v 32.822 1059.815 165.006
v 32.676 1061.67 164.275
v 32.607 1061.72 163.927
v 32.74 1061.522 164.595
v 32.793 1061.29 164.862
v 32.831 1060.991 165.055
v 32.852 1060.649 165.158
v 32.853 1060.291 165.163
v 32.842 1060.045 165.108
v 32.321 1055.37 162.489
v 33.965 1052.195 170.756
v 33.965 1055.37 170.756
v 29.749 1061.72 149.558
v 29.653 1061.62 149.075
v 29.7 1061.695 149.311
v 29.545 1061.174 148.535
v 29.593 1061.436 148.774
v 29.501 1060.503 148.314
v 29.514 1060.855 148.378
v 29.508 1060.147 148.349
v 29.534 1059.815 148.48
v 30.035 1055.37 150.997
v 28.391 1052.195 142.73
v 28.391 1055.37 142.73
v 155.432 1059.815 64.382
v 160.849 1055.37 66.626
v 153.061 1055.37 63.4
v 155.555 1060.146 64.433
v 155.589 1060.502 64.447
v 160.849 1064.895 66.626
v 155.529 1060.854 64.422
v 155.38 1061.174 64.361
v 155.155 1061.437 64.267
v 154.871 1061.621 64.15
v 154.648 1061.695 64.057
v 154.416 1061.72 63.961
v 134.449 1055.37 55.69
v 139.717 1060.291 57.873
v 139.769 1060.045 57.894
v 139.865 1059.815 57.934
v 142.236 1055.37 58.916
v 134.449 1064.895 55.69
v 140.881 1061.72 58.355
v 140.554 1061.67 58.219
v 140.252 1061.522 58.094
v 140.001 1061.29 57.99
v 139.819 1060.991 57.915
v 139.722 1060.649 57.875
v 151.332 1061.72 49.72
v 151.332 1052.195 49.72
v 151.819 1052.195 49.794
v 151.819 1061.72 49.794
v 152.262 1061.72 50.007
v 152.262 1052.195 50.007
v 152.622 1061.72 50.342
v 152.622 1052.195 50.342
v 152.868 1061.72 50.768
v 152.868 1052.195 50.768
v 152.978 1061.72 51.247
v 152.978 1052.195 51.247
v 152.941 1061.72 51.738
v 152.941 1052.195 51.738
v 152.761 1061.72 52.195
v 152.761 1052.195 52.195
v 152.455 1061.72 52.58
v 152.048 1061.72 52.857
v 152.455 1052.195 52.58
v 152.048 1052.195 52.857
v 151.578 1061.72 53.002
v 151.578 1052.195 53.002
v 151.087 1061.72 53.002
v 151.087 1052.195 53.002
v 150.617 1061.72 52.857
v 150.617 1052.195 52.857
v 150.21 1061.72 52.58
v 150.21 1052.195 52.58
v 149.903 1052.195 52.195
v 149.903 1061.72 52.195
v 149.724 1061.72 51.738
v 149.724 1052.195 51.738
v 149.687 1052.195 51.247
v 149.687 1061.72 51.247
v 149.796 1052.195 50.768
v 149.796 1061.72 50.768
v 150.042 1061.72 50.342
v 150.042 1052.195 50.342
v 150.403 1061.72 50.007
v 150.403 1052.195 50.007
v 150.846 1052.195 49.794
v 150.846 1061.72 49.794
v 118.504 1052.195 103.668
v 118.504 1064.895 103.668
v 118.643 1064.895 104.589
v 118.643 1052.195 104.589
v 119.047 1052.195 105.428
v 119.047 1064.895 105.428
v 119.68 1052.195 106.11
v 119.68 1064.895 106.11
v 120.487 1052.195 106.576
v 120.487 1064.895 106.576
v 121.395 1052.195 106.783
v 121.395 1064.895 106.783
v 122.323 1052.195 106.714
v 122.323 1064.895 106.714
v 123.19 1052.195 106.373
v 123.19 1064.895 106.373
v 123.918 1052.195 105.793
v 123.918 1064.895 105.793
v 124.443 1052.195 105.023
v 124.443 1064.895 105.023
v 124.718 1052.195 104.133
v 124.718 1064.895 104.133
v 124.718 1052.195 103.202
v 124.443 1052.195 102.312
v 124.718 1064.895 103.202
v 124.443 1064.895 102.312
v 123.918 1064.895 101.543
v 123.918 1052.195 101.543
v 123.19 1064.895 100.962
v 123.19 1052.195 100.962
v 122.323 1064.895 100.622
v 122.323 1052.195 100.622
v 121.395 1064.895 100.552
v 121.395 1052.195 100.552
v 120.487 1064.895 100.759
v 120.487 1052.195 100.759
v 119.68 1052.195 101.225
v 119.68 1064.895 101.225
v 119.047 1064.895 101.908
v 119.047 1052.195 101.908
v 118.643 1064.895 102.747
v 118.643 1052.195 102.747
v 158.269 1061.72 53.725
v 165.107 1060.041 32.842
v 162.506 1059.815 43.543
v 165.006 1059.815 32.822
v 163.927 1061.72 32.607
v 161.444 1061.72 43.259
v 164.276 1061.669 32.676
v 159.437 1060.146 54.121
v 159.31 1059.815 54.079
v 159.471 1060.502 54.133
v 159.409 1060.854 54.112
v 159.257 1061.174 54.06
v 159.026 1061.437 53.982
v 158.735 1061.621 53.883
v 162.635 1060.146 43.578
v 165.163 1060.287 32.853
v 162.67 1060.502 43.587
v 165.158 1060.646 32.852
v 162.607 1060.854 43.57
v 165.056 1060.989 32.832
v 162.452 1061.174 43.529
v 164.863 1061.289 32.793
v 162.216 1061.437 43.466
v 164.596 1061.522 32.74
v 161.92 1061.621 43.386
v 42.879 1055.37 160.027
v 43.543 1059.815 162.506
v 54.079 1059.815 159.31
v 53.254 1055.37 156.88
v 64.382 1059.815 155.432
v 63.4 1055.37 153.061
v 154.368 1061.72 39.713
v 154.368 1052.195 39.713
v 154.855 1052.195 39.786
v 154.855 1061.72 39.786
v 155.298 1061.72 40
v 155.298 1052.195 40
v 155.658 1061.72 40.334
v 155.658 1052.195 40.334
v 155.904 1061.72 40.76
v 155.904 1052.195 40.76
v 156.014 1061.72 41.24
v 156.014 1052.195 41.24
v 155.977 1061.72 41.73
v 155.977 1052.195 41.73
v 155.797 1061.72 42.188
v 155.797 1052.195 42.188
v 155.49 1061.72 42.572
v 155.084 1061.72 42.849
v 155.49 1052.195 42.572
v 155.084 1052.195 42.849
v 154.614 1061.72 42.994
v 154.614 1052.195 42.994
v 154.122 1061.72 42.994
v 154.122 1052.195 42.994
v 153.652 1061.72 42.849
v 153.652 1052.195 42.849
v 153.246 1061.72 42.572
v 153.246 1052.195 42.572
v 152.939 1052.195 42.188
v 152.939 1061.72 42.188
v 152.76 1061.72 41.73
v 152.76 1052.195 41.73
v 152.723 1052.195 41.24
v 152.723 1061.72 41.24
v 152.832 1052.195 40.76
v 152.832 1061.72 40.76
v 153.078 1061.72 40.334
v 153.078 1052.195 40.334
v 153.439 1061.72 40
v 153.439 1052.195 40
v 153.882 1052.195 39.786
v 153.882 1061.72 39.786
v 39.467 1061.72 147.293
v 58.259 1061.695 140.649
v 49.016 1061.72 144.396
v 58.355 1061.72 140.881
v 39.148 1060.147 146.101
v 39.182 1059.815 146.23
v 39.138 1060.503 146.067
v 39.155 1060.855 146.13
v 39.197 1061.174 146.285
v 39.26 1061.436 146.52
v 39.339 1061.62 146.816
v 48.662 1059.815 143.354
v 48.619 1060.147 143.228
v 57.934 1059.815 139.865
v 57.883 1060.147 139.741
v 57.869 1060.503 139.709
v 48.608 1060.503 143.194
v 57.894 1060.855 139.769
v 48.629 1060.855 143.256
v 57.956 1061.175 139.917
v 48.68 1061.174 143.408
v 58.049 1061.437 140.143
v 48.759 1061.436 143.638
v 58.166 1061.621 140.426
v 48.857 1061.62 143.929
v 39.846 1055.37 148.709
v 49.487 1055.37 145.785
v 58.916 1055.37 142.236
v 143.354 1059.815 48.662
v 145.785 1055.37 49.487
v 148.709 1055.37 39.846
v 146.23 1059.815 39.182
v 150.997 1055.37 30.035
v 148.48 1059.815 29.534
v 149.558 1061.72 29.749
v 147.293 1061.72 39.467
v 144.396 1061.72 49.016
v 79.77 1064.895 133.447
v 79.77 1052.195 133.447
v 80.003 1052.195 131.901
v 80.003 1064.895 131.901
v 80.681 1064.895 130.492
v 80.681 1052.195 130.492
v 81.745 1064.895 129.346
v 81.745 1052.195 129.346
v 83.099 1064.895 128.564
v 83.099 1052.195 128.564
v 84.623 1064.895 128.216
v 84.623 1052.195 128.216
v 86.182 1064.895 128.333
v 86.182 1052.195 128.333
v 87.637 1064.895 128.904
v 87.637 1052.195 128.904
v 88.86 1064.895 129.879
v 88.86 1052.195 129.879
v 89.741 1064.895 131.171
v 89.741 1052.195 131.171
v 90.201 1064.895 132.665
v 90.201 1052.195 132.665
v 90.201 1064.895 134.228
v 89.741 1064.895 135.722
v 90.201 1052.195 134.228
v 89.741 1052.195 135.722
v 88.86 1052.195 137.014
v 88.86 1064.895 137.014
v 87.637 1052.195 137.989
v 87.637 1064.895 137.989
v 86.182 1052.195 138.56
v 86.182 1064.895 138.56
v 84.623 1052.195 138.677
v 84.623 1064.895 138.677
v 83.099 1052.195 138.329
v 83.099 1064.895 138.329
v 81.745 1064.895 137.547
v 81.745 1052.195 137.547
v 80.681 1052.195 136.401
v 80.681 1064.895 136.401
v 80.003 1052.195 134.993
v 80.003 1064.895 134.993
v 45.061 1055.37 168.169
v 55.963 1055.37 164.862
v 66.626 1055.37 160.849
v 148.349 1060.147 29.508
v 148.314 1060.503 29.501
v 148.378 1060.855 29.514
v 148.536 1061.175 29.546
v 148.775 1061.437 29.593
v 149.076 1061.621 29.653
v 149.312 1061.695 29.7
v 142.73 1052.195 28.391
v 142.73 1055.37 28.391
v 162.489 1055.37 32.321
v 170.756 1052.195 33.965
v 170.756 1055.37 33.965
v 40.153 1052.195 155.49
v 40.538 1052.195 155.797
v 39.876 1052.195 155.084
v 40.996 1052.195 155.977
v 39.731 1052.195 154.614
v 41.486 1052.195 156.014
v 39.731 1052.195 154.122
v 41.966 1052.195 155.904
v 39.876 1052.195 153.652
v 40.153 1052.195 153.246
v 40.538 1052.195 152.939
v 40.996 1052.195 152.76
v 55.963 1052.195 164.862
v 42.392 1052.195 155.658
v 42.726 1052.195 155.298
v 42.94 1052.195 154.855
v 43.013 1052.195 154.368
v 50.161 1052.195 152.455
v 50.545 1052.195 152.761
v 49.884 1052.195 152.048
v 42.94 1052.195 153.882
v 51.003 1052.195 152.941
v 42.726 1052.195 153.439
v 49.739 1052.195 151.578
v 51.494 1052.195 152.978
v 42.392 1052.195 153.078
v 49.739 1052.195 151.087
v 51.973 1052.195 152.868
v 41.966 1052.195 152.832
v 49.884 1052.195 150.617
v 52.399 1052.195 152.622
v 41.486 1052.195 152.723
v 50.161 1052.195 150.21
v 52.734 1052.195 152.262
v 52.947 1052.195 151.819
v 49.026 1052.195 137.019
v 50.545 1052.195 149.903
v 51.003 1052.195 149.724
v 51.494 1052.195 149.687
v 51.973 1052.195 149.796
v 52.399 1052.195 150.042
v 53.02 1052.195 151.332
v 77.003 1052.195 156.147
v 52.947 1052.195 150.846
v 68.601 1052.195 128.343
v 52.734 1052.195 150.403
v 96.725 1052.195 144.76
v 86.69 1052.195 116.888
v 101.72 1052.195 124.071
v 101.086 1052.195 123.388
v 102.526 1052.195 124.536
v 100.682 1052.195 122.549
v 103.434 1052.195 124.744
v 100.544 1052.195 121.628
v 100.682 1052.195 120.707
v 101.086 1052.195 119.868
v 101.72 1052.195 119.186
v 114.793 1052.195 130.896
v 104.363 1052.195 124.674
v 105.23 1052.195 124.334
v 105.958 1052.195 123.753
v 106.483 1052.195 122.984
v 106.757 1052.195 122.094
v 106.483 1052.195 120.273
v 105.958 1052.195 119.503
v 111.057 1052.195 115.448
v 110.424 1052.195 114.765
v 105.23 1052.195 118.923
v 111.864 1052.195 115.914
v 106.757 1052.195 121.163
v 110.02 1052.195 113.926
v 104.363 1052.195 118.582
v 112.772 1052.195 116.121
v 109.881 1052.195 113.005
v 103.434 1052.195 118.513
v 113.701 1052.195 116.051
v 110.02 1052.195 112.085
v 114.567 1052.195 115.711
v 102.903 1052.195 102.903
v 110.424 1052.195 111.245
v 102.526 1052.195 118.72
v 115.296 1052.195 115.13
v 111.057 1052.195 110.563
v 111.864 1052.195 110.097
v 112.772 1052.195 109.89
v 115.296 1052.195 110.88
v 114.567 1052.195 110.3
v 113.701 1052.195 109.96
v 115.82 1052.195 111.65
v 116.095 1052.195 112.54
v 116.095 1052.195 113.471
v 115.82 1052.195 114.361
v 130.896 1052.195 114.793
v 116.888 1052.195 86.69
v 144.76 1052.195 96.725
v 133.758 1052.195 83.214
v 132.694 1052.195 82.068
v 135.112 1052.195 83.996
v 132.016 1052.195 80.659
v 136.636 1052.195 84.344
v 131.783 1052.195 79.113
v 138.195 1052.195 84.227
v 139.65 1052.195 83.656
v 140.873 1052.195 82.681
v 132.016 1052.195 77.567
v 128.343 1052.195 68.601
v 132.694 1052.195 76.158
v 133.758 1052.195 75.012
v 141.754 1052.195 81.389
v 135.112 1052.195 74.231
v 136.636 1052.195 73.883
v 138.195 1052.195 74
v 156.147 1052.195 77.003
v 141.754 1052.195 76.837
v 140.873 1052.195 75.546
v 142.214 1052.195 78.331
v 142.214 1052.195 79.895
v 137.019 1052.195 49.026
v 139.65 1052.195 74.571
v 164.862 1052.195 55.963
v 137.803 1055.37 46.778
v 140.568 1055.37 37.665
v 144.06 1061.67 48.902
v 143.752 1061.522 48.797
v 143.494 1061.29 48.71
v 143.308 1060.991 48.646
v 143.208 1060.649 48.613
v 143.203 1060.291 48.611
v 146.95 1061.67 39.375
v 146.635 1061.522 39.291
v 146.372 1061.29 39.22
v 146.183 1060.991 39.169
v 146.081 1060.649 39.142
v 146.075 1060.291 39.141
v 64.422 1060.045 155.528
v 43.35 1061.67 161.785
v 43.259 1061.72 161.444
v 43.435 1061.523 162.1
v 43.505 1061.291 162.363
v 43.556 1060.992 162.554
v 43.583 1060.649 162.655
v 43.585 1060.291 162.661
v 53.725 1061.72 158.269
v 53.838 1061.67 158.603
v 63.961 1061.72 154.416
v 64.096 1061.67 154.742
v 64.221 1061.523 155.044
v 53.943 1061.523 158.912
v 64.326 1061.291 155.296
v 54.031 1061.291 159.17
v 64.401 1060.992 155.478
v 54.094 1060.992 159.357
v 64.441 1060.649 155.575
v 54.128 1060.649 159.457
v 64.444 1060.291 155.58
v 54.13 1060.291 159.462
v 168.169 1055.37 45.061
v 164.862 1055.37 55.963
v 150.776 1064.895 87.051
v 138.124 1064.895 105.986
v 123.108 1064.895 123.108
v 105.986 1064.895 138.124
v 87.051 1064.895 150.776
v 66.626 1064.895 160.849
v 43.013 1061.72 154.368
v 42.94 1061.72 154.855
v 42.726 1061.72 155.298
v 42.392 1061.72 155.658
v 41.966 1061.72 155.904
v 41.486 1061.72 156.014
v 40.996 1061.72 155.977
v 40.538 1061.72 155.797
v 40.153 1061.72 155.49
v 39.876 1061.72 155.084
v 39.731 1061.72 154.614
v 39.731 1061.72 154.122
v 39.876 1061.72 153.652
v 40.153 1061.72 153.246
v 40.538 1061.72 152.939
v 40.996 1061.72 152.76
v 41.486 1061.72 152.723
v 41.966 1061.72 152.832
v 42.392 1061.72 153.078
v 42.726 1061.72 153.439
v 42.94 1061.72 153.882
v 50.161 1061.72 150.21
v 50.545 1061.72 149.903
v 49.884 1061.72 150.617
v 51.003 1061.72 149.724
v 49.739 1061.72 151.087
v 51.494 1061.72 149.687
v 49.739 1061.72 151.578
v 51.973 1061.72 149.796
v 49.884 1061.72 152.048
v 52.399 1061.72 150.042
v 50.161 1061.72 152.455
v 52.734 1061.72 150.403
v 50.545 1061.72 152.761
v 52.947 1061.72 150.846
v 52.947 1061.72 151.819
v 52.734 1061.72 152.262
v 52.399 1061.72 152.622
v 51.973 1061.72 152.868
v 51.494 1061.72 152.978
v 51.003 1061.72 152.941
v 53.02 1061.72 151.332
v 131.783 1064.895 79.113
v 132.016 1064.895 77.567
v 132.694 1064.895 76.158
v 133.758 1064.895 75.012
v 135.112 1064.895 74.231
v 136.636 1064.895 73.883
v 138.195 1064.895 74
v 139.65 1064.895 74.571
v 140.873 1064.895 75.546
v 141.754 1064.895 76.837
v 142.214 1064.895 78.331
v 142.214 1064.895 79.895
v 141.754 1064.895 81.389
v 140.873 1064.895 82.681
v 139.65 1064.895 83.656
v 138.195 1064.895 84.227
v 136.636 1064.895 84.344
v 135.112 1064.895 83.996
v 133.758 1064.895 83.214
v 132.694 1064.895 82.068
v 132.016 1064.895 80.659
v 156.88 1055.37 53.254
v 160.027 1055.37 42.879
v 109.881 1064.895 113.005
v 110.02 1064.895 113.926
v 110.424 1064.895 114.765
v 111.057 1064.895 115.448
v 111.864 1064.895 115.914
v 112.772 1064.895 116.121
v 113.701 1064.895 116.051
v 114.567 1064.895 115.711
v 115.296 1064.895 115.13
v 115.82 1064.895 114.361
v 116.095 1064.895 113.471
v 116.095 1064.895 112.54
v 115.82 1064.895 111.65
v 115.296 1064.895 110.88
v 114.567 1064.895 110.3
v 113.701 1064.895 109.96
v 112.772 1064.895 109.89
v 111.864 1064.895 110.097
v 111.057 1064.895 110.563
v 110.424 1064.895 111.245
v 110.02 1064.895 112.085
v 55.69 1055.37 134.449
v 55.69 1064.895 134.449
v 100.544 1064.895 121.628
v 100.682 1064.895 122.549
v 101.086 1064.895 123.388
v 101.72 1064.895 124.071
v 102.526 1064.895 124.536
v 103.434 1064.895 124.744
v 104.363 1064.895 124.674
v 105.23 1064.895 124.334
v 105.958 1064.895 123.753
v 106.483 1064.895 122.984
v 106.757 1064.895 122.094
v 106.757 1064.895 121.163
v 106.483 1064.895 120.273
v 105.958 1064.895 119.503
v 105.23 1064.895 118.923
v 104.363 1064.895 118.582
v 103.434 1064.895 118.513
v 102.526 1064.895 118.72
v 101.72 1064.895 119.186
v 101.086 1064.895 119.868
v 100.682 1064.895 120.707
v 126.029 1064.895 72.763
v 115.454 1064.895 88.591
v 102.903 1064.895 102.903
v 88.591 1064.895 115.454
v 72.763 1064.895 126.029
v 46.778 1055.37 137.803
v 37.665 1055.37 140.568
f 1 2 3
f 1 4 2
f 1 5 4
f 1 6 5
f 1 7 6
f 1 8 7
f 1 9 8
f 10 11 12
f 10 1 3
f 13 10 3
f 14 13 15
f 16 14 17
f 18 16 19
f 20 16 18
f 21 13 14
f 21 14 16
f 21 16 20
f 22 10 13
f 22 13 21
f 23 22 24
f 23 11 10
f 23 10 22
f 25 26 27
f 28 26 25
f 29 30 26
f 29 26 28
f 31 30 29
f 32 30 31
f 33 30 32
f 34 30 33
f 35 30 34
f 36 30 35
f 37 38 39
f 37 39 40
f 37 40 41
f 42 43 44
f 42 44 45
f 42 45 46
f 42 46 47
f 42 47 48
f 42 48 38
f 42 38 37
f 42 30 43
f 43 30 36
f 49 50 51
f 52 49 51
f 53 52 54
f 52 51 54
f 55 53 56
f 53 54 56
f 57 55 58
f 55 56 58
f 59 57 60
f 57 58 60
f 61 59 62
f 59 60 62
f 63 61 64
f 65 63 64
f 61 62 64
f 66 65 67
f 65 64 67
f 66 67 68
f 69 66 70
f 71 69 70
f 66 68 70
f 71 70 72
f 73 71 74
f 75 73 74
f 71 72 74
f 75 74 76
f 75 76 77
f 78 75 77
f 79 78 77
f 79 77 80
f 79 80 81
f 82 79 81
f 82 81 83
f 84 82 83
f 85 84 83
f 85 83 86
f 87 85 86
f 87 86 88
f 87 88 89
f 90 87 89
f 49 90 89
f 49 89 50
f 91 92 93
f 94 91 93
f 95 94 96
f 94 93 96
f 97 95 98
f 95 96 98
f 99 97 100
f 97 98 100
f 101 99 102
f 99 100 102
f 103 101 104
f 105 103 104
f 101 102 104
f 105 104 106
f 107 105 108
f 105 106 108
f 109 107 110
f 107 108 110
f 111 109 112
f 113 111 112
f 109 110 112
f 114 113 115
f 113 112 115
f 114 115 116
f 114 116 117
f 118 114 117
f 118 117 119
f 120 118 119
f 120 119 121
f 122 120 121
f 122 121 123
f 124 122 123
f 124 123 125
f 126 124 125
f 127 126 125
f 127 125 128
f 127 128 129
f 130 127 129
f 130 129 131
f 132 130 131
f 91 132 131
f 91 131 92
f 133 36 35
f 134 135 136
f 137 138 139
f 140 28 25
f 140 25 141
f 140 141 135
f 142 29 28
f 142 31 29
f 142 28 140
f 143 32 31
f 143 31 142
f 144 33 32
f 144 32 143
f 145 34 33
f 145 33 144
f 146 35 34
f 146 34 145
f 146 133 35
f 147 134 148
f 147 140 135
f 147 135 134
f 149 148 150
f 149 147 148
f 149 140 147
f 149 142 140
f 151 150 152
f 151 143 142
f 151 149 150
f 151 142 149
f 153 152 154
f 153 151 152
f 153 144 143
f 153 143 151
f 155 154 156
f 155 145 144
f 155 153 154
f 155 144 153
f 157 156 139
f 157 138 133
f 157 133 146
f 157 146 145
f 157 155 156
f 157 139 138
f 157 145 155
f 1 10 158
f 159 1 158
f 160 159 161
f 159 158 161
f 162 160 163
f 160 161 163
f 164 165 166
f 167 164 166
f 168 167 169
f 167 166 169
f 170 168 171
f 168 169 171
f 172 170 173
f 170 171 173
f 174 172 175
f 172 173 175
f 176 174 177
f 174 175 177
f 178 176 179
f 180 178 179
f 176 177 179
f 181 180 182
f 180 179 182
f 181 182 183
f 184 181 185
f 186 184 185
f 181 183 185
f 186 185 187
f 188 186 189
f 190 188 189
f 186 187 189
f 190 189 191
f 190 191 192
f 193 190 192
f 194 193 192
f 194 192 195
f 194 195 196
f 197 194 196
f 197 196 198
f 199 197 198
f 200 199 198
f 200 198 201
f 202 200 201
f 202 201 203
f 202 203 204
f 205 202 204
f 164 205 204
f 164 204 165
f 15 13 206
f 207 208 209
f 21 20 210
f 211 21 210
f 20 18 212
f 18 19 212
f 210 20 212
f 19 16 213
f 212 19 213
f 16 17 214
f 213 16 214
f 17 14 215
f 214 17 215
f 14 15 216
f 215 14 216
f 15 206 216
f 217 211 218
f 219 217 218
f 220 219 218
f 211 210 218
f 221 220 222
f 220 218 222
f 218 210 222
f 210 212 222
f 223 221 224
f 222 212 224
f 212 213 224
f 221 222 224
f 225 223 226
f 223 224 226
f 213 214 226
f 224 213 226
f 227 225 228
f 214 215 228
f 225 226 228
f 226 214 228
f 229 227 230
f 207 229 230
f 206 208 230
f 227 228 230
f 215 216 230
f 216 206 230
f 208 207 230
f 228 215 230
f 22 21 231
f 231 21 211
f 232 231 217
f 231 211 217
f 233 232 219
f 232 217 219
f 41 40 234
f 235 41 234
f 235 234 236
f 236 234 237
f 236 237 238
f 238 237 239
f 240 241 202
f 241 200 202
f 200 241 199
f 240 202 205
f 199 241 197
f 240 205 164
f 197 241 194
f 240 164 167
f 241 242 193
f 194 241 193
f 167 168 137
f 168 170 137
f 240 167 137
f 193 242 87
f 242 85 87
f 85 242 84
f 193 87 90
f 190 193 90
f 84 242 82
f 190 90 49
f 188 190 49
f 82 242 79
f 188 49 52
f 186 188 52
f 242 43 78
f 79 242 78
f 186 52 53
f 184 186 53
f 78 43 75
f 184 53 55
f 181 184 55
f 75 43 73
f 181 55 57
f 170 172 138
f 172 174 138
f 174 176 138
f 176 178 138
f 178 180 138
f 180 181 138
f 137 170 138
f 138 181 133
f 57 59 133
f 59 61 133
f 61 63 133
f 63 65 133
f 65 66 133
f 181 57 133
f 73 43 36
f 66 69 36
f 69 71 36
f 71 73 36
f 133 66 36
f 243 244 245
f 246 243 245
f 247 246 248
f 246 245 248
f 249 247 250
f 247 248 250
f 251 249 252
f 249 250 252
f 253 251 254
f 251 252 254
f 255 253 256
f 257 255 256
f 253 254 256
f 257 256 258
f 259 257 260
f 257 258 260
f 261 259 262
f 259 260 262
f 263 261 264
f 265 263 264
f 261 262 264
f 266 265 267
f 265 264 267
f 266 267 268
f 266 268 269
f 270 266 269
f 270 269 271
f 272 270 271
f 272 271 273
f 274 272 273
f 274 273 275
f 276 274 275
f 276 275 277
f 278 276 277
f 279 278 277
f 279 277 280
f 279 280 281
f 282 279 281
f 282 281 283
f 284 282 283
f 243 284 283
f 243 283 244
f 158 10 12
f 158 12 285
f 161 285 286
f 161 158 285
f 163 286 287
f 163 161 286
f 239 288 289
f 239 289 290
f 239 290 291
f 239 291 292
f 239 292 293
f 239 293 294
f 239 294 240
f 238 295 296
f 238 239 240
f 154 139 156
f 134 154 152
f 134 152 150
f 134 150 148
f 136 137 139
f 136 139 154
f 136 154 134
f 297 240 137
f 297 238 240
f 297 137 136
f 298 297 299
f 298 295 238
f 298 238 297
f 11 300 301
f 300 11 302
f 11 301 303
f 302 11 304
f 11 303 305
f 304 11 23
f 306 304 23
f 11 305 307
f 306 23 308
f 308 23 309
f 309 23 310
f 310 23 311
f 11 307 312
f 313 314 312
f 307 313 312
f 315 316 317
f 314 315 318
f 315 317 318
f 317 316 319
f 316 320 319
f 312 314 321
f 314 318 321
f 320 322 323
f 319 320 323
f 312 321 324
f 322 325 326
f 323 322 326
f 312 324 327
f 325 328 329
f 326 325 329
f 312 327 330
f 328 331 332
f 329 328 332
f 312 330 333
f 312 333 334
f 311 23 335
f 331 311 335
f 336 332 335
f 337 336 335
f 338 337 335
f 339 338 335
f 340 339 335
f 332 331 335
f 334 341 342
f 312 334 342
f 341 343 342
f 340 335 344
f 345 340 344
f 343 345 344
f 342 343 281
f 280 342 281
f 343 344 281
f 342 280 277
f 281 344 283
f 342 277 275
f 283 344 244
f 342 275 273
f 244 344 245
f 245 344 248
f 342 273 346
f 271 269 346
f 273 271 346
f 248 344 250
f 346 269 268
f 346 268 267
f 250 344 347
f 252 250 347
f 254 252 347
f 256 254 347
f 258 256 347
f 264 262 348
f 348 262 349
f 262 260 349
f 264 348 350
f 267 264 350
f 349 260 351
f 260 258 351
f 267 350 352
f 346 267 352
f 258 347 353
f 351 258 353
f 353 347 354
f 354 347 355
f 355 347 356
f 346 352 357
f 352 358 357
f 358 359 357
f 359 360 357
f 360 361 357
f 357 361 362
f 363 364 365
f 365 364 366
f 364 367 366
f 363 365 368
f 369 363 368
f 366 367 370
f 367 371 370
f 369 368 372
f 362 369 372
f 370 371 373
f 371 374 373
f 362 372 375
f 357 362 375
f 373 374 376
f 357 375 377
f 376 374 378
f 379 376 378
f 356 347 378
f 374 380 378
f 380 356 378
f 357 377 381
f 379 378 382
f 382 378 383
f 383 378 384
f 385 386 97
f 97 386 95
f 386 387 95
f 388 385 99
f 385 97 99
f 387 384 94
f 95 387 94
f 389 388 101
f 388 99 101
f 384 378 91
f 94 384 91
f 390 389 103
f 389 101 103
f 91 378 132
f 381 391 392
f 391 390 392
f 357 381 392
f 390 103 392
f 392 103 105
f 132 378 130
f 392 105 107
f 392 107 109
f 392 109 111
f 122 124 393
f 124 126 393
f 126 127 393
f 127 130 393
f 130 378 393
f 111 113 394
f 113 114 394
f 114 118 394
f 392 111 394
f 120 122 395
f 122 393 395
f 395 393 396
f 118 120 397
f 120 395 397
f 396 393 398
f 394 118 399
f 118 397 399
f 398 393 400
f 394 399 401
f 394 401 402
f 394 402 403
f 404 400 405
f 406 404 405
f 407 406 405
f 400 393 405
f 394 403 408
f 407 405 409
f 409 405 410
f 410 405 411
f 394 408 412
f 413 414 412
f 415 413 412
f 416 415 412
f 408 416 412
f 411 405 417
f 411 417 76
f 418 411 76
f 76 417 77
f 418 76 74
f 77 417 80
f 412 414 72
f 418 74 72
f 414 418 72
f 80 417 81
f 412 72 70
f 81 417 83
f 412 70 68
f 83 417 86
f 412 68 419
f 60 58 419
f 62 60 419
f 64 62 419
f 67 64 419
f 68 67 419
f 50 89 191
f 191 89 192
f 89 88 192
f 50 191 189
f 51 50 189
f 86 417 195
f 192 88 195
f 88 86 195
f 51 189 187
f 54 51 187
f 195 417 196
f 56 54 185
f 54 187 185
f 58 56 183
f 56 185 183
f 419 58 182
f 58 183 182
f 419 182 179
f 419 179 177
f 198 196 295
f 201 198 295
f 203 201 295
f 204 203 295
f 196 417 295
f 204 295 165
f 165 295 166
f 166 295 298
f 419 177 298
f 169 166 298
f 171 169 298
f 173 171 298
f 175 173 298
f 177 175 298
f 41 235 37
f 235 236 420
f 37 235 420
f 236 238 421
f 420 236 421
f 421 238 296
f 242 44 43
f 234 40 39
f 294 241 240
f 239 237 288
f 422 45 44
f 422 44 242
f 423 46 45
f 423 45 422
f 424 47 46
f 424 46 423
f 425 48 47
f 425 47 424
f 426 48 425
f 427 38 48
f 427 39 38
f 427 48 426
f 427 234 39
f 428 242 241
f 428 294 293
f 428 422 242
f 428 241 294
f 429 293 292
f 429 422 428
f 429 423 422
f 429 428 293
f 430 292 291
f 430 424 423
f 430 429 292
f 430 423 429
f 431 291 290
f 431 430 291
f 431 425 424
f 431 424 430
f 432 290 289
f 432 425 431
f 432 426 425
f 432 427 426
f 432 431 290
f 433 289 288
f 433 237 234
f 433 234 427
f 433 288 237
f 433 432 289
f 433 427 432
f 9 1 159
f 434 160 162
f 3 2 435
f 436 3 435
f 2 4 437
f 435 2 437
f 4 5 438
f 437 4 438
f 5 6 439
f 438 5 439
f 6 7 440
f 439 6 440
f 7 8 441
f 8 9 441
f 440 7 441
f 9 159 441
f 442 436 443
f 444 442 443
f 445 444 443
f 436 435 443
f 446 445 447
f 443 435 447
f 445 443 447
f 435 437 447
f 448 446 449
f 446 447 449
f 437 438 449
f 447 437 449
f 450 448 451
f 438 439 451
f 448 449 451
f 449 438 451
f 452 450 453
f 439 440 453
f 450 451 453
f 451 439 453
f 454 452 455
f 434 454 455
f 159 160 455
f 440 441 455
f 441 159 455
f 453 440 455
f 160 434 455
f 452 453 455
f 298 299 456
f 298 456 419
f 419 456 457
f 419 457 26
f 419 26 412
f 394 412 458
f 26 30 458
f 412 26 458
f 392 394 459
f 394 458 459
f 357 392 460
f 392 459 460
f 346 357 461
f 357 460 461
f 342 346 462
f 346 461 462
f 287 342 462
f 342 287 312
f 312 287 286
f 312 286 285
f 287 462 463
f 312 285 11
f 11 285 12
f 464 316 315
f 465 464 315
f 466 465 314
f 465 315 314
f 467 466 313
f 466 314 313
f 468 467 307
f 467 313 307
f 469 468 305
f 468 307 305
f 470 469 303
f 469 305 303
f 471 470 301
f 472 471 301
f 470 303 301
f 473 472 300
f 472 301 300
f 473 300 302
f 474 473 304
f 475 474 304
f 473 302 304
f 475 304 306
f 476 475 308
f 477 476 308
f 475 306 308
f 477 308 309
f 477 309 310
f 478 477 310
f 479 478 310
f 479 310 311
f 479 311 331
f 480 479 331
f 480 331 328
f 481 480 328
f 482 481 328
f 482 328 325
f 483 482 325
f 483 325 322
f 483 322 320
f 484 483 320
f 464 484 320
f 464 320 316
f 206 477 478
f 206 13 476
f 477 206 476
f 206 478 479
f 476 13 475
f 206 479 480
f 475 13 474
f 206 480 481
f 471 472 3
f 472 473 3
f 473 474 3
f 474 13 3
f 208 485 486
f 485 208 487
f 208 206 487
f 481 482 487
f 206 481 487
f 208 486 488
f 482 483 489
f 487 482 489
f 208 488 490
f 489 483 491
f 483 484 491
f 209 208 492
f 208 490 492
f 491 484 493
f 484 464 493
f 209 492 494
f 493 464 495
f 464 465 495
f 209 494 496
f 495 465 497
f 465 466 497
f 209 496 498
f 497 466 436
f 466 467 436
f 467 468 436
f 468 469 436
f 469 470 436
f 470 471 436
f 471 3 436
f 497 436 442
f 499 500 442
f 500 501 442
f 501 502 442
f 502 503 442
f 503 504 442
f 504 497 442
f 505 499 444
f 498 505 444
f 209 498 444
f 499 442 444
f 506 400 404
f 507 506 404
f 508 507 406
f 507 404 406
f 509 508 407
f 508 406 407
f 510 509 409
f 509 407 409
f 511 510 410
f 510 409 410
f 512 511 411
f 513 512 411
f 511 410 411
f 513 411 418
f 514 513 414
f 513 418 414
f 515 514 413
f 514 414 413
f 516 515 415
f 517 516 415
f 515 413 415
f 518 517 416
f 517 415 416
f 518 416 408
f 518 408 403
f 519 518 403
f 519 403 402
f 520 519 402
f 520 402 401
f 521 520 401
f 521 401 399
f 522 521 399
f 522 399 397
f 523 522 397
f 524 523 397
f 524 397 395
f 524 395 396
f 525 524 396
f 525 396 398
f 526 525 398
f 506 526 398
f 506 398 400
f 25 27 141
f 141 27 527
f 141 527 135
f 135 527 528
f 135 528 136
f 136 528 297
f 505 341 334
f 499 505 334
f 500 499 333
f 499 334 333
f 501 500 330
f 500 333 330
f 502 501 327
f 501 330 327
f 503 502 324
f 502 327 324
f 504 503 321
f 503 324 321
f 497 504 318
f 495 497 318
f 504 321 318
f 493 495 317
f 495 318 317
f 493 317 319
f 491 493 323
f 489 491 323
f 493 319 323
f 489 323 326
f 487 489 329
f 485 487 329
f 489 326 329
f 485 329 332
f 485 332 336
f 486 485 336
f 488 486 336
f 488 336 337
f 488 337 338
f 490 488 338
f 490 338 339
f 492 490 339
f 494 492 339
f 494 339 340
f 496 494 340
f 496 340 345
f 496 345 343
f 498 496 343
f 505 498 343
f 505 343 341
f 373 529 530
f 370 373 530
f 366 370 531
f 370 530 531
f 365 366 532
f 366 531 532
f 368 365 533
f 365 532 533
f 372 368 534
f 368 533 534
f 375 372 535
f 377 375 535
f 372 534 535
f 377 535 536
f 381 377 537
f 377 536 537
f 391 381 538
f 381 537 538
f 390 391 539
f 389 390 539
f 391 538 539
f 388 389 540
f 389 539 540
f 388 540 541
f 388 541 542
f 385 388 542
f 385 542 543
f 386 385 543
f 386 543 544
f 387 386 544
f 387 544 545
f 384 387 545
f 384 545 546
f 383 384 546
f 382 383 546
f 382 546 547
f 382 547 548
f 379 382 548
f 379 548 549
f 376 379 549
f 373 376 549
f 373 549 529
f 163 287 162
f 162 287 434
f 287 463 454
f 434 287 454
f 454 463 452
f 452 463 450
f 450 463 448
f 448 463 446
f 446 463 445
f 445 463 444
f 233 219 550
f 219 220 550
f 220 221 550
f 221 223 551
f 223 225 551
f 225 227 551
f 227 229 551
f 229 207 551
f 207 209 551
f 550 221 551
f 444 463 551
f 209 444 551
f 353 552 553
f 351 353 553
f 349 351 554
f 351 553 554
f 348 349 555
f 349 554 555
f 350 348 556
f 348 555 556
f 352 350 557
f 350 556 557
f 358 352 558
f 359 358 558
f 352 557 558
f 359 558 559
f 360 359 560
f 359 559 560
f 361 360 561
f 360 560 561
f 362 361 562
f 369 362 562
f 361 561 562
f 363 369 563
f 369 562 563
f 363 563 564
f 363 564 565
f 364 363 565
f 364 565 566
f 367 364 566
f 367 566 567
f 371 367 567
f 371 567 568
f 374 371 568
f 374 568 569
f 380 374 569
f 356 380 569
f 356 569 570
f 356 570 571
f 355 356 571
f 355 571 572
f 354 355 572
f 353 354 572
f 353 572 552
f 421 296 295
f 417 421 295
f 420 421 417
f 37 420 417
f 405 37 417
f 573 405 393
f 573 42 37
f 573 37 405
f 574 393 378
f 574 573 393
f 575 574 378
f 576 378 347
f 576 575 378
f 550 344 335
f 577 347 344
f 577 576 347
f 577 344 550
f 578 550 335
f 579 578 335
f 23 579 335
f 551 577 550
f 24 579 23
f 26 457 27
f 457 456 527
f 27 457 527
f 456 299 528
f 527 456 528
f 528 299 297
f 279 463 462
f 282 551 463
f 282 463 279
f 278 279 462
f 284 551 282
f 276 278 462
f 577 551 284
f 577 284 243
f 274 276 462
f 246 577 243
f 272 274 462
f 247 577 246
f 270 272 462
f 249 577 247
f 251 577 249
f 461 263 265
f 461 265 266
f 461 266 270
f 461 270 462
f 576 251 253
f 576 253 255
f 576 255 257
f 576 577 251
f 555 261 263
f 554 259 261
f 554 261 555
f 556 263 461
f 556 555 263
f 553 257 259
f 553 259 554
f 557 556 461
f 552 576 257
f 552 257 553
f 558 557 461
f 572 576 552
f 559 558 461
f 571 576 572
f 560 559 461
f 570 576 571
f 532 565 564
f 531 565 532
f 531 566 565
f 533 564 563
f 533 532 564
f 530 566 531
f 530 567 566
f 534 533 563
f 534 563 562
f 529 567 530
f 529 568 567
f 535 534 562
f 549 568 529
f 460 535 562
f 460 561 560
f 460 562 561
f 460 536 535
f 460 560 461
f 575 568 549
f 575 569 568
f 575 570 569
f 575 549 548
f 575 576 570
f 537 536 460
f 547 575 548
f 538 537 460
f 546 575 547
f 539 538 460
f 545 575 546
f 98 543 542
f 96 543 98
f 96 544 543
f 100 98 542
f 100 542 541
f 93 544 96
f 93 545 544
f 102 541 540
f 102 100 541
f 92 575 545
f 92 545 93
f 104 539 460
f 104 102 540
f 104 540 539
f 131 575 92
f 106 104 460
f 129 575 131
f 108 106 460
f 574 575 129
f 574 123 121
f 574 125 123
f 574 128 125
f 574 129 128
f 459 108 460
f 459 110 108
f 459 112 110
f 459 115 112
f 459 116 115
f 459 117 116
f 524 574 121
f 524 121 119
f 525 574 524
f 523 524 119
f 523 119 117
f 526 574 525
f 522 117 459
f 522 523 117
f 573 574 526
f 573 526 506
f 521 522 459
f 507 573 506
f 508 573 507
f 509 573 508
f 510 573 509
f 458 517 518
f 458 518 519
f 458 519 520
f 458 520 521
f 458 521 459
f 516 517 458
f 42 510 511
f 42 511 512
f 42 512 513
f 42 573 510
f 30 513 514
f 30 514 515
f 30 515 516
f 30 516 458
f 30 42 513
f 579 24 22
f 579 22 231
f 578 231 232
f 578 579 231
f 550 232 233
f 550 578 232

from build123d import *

# Parameters (mm, degrees)
SKETCH1_W                = 28.575
SKETCH1_H                = 12.7
CUT_EXTRUDE1_DEPTH       = 9.525
F_12_CLEARANCE_HOLE1_D   = 6.2484
M4X0_7_TAPPED_HOLE1_D    = 3.3
CIRPATTERN1_COUNT        = 4
Z_0_413_DIAMETER_HOLE1_D = 10.4902
FILLET1_R                = 1.27
CUT_EXTRUDE2_DEPTH       = 247.298196718
CUT_EXTRUDE2_DEPTH_BACK  = 247.298196718


with BuildPart() as part:
    # Sketch1 → Revolve1 (revolve)
    with BuildSketch(Plane.XY, mode=Mode.PRIVATE) as revolve1_sk:
        with Locations((159.813733777, 1058.545)):
            Rectangle(SKETCH1_W, SKETCH1_H)
    revolve(revolve1_sk.sketch.rotate(Axis((0, 1125.81516809, 0), (0, -1, 0)), 180), axis=Axis((0, 1125.81516809, 0), (0, -1, 0)))

    # Sketch19 → Cut-Extrude1 (cut)
    with BuildSketch(Plane(origin=(0, 1064.895, 0), x_dir=(1, 0, 0), z_dir=(0, 1, 0))):
        with BuildLine():
            Line((160.848566471, -66.625657721), (134.44870883, -55.690478641))
            ThreePointArc((134.44870883, -55.690478641), (145.526233777, 0), (134.44870883, 55.690478641))
            Line((134.44870883, 55.690478641), (160.848566471, 66.625657721))
            ThreePointArc((160.848566471, 66.625657721), (174.101233777, 0), (160.848566471, -66.625657721))
        make_face()
        with BuildLine():
            Line((-66.625657721, 160.848566471), (-55.690478641, 134.44870883))
            ThreePointArc((-55.690478641, 134.44870883), (0, 145.526233777), (55.690478641, 134.44870883))
            Line((55.690478641, 134.44870883), (66.625657721, 160.848566471))
            ThreePointArc((66.625657721, 160.848566471), (0, 174.101233777), (-66.625657721, 160.848566471))
        make_face()
        with BuildLine():
            Line((-134.44870883, -55.690478641), (-160.848566471, -66.625657721))
            ThreePointArc((-160.848566471, -66.625657721), (-174.101233777, 0), (-160.848566471, 66.625657721))
            Line((-160.848566471, 66.625657721), (-134.44870883, 55.690478641))
            ThreePointArc((-134.44870883, 55.690478641), (-145.526233777, 0), (-134.44870883, -55.690478641))
        make_face()
        with BuildLine():
            Line((-55.690478641, -134.44870883), (-66.625657721, -160.848566471))
            ThreePointArc((-66.625657721, -160.848566471), (0, -174.101233777), (66.625657721, -160.848566471))
            Line((66.625657721, -160.848566471), (55.690478641, -134.44870883))
            ThreePointArc((55.690478641, -134.44870883), (0, -145.526233777), (-55.690478641, -134.44870883))
        make_face()
    extrude(amount=-CUT_EXTRUDE1_DEPTH, mode=Mode.SUBTRACT)

    # Sketch21 → Revolve2 (revolve)
    with BuildSketch(Plane.XY):
        Polygon((-165.672559567, 1055.37), (-153.954907986, 1055.37), (-150.288733777, 1061.72), (-169.338733777, 1061.72), align=None)
    revolve(axis=Axis((0, 0, 0), (0, 1, 0)))

    # #12 Clearance Hole1 (through all)
    with Locations(Plane(origin=(0, 1052.195, 0), x_dir=(-1, 0, 0), z_dir=(0, -1, 0))):
        with Locations((103.667734326, 121.628246568), (121.628246568, 103.667734326), (113.00537488, 113.00537488)):
            f_12_clearance_hole1 = Hole(F_12_CLEARANCE_HOLE1_D / 2)

    # M4x0.7 Tapped Hole1 (through all)
    with Locations(Plane(origin=(0, 1061.72, 0), x_dir=(1, 0, 0), z_dir=(0, 1, 0))):
        with Locations((-51.370441133, 151.33243962), (-41.36283797, 154.36821285), (51.370441133, 151.33243962), (41.36283797, 154.36821285)):
            m4x0_7_tapped_hole1 = Hole(M4X0_7_TAPPED_HOLE1_D / 2)

    # CirPattern1: #12 Clearance Hole1, M4x0.7 Tapped Hole1 ×4 about axis
    cirpattern1_axis = Axis((0, 0, 0), (0, 1, 0))
    add([f_12_clearance_hole1.rotate(cirpattern1_axis, i * 360 / CIRPATTERN1_COUNT) for i in range(1, CIRPATTERN1_COUNT)], mode=Mode.SUBTRACT)
    add([m4x0_7_tapped_hole1.rotate(cirpattern1_axis, i * 360 / CIRPATTERN1_COUNT) for i in range(1, CIRPATTERN1_COUNT)], mode=Mode.SUBTRACT)

    # Z (0.413) Diameter Hole1 (through all)
    with Locations(Plane(origin=(0, 1064.895, 0), x_dir=(1, 0, 0), z_dir=(0, 1, 0))):
        with Locations((-137.027937996, -79.113116888), (137.027937996, -79.113116888), (137.027937996, 79.113116888), (-137.027937996, 79.113116888), (-85.014893438, 133.44665207), (85.014893438, 133.44665207), (85.014893438, -133.44665207), (-85.014893438, -133.44665207)):
            Hole(Z_0_413_DIAMETER_HOLE1_D / 2)

    # Fillet1
    fillet1_edges = [part.edges().sort_by_distance(p)[0] for p in [
        (-150.288733777, 1061.72, 0),
        (0, 1061.72, 150.288733777),
        (0, 1061.72, -150.288733777),
        (150.288733777, 1061.72, 0),
        (-169.338733777, 1061.72, 0),
        (0, 1061.72, 169.338733777),
        (0, 1061.72, -169.338733777),
        (169.338733777, 1061.72, 0),
    ]]
    fillet(fillet1_edges, radius=FILLET1_R)

    # Sketch23 → Cut-Extrude2 (cut, two sides: drawn at the far end of the back side and taken through both)
    with BuildSketch(Plane(origin=(0, 1058.545, 0), x_dir=(1, 0, 0), z_dir=(0, 1, 0)).offset(-CUT_EXTRUDE2_DEPTH_BACK)):
        with BuildLine():
            ThreePointArc((174.101233777, 0), (173.262888749, 17.064905063), (170.755927388, 33.965465761))
            Line((170.755927388, 33.965465761), (142.729988001, 28.390759809))
            ThreePointArc((142.729988001, 28.390759809), (144.825485185, 14.264065278), (145.526233777, 0))
            ThreePointArc((145.526233777, 0), (144.825485185, -14.264065278), (142.729988001, -28.390759809))
            Line((142.729988001, -28.390759809), (170.755927388, -33.965465761))
            ThreePointArc((170.755927388, -33.965465761), (173.262888749, -17.064905063), (174.101233777, 0))
        make_face()
        with BuildLine():
            Line((-142.729988001, 28.390759809), (-170.755927388, 33.965465761))
            ThreePointArc((-170.755927388, 33.965465761), (-174.101233777, 0), (-170.755927388, -33.965465761))
            Line((-170.755927388, -33.965465761), (-142.729988001, -28.390759809))
            ThreePointArc((-142.729988001, -28.390759809), (-145.526233777, 0), (-142.729988001, 28.390759809))
        make_face()
        with BuildLine():
            Line((28.390759809, 142.729988001), (33.965465761, 170.755927388))
            ThreePointArc((33.965465761, 170.755927388), (0, 174.101233777), (-33.965465761, 170.755927388))
            Line((-33.965465761, 170.755927388), (-28.390759809, 142.729988001))
            ThreePointArc((-28.390759809, 142.729988001), (0, 145.526233777), (28.390759809, 142.729988001))
        make_face()
        with BuildLine():
            ThreePointArc((28.390759809, -142.729988001), (0, -145.526233777), (-28.390759809, -142.729988001))
            Line((-28.390759809, -142.729988001), (-33.965465761, -170.755927388))
            ThreePointArc((-33.965465761, -170.755927388), (0, -174.101233777), (33.965465761, -170.755927388))
            Line((33.965465761, -170.755927388), (28.390759809, -142.729988001))
        make_face()
    extrude(amount=CUT_EXTRUDE2_DEPTH + CUT_EXTRUDE2_DEPTH_BACK, mode=Mode.SUBTRACT)


with BuildPart() as cut_extrude2_kept_piece:
    # of the separate pieces the step leaves, the one the design keeps (cut_extrude2_pieces_kept)
    add(part.part.solids().sort_by_distance((32.321112995, 1055.37, 162.48920779))[0])


solid = cut_extrude2_kept_piece.part
